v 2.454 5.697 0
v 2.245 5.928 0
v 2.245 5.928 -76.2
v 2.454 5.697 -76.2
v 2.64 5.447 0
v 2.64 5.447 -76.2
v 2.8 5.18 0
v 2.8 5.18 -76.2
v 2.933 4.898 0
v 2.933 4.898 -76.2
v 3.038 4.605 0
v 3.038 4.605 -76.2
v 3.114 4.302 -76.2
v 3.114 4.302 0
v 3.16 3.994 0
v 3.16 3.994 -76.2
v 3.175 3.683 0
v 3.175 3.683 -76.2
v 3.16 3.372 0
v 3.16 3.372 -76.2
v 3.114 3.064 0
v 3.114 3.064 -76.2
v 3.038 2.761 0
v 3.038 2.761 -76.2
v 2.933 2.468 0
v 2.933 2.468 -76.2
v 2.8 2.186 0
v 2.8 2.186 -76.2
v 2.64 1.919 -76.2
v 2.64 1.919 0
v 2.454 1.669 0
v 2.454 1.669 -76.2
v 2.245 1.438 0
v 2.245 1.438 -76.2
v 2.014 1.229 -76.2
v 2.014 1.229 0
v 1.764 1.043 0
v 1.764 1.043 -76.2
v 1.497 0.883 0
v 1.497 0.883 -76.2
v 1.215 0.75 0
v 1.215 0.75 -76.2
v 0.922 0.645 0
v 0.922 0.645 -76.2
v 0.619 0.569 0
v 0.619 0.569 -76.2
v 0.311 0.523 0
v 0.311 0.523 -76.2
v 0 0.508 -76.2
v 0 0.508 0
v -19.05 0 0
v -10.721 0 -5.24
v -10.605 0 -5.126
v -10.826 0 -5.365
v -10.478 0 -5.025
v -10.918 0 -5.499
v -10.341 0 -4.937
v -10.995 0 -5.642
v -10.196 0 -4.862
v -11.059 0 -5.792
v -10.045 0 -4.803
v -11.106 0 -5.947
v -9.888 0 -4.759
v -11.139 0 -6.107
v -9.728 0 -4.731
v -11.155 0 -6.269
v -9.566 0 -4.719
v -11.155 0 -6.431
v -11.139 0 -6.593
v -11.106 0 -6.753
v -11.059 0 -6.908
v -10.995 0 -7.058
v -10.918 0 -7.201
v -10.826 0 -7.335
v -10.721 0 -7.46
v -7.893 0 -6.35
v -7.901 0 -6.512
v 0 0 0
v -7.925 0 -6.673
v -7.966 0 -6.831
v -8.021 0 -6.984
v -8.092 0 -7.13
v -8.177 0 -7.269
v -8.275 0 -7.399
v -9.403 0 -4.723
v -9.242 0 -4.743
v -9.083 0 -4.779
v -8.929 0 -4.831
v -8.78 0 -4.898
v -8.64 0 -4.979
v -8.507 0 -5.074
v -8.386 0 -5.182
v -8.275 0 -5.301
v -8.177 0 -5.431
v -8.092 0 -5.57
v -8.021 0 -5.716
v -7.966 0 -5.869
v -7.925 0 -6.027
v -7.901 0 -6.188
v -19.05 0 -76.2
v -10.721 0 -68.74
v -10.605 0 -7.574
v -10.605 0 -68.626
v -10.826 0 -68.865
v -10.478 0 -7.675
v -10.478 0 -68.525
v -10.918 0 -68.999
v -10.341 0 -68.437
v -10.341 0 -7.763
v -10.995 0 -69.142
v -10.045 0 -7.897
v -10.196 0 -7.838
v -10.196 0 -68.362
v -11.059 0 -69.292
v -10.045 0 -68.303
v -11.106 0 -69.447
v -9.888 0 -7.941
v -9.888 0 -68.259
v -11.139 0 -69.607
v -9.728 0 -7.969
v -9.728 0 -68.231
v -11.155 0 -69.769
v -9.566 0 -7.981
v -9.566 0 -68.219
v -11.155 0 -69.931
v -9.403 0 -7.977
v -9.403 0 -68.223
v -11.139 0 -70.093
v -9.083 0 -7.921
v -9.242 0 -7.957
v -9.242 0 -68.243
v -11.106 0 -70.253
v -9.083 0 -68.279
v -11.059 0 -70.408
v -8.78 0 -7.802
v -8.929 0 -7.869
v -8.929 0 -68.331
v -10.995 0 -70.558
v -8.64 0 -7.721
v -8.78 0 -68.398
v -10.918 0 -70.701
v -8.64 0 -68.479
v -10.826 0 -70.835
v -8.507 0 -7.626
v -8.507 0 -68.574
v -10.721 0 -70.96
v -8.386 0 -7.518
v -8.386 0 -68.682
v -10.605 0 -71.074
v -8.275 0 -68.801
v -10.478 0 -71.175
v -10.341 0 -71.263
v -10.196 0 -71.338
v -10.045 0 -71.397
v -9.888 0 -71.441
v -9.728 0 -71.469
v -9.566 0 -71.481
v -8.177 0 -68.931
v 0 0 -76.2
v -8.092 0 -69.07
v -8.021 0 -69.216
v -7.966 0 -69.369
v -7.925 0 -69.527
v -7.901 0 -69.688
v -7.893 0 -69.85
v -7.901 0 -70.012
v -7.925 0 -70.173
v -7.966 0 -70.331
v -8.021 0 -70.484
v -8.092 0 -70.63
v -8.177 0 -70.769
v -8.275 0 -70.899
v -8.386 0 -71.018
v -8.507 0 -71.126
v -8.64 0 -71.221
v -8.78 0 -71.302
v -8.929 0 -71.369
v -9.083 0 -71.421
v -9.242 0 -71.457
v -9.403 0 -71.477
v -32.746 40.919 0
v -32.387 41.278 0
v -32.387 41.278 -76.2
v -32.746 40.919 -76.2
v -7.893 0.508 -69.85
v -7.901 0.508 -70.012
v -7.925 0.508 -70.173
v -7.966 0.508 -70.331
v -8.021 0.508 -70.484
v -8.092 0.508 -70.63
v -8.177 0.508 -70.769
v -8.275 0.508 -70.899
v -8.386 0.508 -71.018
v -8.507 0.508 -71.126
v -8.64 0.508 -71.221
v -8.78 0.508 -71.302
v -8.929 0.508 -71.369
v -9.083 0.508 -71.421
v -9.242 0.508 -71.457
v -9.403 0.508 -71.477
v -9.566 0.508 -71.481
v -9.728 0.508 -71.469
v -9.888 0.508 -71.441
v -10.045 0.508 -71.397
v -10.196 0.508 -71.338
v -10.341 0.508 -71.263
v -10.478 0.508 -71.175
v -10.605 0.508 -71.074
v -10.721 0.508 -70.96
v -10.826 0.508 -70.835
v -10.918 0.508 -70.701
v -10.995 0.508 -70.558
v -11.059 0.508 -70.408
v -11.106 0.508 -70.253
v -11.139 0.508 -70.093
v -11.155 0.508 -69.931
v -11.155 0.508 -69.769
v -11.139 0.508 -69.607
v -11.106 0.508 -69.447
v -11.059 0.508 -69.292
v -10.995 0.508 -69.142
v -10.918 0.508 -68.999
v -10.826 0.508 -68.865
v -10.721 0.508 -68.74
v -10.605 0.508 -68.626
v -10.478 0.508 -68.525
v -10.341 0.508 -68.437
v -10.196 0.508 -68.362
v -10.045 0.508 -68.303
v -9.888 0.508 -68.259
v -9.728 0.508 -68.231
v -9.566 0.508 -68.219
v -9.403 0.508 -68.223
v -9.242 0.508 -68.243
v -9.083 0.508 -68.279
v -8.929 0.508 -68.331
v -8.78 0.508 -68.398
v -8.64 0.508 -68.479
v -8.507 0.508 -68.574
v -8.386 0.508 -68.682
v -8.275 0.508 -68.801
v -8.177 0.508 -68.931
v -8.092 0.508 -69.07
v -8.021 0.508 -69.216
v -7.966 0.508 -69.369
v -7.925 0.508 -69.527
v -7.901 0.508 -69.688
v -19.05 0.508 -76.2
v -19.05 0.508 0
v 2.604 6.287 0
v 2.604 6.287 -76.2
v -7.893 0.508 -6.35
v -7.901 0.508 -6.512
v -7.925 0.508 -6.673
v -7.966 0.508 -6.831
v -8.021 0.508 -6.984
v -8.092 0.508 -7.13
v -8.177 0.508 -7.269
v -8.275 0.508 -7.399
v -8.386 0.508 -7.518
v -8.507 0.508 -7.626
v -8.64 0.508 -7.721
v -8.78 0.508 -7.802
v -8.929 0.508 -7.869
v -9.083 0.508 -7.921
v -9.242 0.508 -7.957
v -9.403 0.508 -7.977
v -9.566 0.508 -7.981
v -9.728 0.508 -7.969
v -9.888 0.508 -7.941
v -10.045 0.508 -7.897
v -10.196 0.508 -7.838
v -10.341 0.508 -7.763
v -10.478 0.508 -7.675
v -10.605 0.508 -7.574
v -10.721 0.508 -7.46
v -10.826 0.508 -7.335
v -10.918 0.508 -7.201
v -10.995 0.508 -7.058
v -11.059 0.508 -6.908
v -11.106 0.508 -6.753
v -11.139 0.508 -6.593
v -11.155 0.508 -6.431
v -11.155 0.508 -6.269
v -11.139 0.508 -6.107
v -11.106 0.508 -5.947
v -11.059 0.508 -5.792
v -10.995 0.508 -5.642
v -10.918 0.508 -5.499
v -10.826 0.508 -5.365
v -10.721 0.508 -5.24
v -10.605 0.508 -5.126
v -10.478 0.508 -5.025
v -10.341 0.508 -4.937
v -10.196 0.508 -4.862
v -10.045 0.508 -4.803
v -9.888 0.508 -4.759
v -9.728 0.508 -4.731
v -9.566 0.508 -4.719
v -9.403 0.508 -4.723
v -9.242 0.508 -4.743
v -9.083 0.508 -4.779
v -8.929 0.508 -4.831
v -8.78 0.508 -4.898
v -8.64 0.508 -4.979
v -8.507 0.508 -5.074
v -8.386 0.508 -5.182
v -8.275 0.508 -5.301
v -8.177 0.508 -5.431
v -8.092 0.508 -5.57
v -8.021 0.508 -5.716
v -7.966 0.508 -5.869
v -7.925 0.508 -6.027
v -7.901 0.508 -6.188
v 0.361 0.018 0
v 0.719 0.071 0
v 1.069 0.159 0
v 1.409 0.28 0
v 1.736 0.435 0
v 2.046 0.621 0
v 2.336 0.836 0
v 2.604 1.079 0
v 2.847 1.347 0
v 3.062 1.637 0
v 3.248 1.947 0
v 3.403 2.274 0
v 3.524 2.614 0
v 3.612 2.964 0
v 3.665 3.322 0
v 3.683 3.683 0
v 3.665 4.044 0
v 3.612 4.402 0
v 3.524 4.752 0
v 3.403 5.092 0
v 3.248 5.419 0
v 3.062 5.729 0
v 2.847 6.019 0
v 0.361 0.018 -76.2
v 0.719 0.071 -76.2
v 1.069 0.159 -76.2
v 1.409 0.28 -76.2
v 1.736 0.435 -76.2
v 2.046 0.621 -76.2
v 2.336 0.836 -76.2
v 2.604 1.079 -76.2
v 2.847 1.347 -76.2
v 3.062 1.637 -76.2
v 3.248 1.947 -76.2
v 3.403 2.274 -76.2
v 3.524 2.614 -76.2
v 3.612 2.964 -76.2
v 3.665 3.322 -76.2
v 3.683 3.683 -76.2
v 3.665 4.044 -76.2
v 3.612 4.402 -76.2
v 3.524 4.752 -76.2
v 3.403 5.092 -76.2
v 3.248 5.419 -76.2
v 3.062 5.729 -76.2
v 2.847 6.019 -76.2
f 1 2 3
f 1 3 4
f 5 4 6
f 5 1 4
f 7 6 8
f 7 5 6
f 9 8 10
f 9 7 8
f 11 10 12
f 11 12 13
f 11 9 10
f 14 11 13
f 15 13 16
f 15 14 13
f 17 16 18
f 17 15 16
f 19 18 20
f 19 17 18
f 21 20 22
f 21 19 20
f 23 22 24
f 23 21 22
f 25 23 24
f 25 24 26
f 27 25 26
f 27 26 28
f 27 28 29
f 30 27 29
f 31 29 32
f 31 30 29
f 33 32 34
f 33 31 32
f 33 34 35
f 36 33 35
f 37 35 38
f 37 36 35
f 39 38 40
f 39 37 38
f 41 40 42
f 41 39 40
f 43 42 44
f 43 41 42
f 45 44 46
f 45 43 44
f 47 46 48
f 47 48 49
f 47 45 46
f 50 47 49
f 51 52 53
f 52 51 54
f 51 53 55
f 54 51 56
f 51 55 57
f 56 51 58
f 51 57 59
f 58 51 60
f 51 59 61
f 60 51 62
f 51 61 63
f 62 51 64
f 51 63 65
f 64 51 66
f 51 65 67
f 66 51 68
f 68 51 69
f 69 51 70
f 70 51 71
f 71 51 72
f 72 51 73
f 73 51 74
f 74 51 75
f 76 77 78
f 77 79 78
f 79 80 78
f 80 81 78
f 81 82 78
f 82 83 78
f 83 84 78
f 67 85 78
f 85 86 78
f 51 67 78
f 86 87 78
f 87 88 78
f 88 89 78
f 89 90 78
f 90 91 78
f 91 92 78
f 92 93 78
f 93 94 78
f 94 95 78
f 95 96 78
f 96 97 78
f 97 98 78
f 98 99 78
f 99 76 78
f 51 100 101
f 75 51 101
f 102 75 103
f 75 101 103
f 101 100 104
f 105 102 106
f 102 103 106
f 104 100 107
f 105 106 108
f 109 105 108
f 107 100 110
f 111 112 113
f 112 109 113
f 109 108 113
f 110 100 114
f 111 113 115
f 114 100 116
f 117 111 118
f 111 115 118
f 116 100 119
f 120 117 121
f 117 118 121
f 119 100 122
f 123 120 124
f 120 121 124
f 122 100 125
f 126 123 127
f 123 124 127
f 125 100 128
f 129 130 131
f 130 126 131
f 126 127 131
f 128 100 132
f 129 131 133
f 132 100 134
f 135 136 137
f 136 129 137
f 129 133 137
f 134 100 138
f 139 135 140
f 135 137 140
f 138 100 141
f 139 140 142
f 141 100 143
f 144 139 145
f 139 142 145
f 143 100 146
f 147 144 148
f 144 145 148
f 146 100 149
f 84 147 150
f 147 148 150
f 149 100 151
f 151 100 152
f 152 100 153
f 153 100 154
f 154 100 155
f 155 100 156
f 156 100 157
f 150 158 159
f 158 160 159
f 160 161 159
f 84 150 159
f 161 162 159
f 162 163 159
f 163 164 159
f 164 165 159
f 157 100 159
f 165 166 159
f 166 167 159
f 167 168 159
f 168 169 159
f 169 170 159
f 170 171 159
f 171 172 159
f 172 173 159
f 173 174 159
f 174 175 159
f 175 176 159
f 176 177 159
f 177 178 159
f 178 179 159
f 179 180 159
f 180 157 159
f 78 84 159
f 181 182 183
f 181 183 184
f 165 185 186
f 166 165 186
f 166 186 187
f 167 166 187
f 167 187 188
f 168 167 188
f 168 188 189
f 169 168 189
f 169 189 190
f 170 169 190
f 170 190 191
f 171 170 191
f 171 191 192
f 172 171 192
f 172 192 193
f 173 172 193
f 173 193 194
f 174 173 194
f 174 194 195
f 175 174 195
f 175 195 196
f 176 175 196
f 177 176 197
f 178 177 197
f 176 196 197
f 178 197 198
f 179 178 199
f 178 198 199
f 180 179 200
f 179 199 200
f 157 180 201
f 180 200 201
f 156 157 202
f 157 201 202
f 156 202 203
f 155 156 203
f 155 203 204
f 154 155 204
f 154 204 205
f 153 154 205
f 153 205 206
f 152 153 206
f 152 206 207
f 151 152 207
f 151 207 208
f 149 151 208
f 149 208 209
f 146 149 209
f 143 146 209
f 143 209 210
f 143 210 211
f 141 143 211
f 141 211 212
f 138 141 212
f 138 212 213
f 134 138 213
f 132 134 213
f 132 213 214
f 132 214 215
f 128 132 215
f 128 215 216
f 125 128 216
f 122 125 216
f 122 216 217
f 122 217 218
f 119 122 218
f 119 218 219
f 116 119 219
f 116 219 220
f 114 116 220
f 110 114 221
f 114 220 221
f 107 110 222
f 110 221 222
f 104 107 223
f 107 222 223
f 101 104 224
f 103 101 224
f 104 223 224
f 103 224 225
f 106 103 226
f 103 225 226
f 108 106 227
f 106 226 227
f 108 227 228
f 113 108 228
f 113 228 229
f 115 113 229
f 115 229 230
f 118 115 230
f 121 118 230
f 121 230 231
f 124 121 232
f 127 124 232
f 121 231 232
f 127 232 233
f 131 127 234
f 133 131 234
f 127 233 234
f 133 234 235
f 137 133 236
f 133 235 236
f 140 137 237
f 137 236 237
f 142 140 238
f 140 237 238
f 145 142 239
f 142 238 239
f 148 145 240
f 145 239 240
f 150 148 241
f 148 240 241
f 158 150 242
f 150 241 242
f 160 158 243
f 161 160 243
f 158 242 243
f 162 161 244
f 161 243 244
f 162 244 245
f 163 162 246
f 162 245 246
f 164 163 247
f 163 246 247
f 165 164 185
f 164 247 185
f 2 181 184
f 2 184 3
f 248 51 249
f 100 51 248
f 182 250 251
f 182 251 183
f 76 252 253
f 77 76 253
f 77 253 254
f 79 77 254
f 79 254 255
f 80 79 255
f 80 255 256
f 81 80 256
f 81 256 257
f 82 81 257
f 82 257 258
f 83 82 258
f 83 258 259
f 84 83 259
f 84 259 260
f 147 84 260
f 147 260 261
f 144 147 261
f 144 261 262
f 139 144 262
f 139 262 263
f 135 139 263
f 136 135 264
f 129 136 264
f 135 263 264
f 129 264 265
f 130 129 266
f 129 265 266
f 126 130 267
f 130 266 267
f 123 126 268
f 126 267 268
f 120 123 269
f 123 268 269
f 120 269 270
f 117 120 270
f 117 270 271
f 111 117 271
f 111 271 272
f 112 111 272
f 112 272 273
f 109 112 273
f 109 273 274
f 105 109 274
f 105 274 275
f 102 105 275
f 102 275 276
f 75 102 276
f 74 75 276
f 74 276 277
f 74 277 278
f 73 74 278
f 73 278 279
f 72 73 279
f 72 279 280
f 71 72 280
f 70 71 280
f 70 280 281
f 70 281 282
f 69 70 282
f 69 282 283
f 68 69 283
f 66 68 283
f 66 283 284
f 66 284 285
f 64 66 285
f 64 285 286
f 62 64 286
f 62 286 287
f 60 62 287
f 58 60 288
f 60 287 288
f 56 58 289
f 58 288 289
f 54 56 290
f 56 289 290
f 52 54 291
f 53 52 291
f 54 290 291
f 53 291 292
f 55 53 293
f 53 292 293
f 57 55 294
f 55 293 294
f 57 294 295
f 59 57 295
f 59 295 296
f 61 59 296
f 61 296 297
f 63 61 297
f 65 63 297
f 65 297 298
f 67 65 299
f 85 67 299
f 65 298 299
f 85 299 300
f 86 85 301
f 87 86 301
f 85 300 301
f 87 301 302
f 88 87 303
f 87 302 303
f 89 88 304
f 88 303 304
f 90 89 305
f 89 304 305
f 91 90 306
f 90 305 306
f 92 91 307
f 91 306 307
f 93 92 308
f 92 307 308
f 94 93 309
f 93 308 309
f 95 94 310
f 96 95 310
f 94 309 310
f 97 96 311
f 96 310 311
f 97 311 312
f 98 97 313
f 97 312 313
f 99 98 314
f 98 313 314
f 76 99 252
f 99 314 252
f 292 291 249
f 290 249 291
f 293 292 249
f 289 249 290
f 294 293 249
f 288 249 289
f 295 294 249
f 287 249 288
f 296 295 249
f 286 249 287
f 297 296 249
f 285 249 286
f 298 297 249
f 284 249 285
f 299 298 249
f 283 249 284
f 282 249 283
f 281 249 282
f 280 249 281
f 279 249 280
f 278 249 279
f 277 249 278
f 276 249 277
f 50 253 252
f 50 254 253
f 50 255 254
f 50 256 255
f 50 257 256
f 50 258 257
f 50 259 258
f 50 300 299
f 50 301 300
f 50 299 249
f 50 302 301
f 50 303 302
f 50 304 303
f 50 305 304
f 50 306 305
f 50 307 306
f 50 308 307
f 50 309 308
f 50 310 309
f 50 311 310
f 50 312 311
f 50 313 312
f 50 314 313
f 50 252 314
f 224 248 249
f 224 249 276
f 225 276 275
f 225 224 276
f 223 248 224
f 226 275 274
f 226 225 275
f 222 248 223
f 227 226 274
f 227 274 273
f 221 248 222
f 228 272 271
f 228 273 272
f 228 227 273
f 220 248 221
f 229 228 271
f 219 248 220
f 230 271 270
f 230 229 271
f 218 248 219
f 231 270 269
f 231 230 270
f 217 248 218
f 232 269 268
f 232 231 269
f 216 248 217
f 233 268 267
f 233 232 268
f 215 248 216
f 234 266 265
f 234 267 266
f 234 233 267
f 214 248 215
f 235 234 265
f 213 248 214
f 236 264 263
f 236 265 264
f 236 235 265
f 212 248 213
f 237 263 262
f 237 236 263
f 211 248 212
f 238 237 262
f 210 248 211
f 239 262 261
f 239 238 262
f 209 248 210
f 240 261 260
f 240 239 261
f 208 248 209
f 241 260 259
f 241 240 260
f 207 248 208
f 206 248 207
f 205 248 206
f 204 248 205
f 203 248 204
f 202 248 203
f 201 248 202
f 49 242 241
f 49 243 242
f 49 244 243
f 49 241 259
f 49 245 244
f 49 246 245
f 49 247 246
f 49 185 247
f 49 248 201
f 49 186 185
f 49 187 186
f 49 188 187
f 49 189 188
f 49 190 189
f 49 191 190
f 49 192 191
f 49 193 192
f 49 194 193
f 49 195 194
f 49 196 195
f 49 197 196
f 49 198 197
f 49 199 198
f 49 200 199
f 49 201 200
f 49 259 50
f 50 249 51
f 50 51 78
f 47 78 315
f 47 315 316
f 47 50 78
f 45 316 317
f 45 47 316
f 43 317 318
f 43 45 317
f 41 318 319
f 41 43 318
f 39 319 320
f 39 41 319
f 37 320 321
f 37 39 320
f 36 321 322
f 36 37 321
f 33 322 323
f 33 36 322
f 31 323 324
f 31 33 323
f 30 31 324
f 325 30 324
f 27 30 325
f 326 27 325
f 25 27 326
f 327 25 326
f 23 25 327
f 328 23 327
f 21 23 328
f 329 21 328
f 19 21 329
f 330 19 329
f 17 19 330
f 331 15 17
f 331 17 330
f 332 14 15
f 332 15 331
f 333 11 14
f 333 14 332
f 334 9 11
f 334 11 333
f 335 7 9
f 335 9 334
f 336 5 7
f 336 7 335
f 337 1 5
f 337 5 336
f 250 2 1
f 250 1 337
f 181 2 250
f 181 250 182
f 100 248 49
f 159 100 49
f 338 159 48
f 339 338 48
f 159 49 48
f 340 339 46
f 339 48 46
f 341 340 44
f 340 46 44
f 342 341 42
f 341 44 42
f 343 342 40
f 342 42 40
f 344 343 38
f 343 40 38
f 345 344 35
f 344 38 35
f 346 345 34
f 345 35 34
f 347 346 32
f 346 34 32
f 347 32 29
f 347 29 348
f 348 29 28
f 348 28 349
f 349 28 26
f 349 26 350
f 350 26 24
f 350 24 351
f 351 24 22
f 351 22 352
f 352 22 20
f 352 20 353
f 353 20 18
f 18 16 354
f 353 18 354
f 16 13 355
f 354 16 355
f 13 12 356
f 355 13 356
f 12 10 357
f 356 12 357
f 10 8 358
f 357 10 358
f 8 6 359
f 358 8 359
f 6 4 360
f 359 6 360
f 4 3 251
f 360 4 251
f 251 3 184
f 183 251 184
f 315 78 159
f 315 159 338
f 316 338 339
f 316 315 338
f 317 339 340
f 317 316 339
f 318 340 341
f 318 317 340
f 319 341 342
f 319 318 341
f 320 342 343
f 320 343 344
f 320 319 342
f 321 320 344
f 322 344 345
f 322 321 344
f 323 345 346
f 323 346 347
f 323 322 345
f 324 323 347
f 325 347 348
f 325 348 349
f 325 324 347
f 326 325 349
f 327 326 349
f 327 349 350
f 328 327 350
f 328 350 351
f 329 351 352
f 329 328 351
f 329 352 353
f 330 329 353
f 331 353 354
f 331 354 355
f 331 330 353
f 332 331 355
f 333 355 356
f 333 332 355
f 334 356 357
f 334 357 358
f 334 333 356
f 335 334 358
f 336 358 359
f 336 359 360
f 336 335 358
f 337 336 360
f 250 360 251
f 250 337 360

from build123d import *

# Parameters (mm, degrees)
SKETCH2_W                 = 19.05
SKETCH2_H                 = 76.2
BOSS_EXTRUDE2_DEPTH       = 0.508
EDGE_FLANGE2_DEPTH        = 76.2
F_4_CLEARANCE_HOLE1_D     = 3.2639
F_4_CLEARANCE_HOLE1_DEPTH = 0.508


# Sheet-metal steps are written as plain solids
with BuildPart() as part:
    # Sketch2 → Boss-Extrude2 (new body)
    with BuildSketch(Plane(origin=(0, 0, 0), x_dir=(1, 0, 0), z_dir=(0, 1, 0))):
        with Locations((-9.525, 38.1)):
            Rectangle(SKETCH2_W, SKETCH2_H)
    extrude(amount=BOSS_EXTRUDE2_DEPTH)

    # Edge-Flange2 section (across the edge) → Edge-Flange2 (add)
    with BuildSketch(Plane(origin=(7.665128061, 0.508, 0), x_dir=(-0.7071067811865488, -0.7071067811865464, 0), z_dir=(0, 0, -1))):
        with BuildLine():
            Line((-0.508, 7.665128061), (-0.508, 57.15))
            Line((-0.508, 57.15), (0, 57.15))
            Line((0, 57.15), (0, 7.665128061))
            ThreePointArc((0, 7.665128061), (1.959980102, 4.731810545), (5.42006403, 5.42006403))
            Line((5.42006403, 5.42006403), (5.779274275, 5.060853785))
            ThreePointArc((5.779274275, 5.060853785), (1.765576919, 4.262479742), (-0.508, 7.665128061))
        make_face()
    extrude(amount=EDGE_FLANGE2_DEPTH)

    # #4 Clearance Hole1
    with Locations(Plane(origin=(0, 0, 0), x_dir=(-1, 0, 0), z_dir=(0, -1, 0))):
        with Locations((9.525, 69.85), (9.525, 6.35)):
            Hole(F_4_CLEARANCE_HOLE1_D / 2, depth=F_4_CLEARANCE_HOLE1_DEPTH)


solid = part.part
